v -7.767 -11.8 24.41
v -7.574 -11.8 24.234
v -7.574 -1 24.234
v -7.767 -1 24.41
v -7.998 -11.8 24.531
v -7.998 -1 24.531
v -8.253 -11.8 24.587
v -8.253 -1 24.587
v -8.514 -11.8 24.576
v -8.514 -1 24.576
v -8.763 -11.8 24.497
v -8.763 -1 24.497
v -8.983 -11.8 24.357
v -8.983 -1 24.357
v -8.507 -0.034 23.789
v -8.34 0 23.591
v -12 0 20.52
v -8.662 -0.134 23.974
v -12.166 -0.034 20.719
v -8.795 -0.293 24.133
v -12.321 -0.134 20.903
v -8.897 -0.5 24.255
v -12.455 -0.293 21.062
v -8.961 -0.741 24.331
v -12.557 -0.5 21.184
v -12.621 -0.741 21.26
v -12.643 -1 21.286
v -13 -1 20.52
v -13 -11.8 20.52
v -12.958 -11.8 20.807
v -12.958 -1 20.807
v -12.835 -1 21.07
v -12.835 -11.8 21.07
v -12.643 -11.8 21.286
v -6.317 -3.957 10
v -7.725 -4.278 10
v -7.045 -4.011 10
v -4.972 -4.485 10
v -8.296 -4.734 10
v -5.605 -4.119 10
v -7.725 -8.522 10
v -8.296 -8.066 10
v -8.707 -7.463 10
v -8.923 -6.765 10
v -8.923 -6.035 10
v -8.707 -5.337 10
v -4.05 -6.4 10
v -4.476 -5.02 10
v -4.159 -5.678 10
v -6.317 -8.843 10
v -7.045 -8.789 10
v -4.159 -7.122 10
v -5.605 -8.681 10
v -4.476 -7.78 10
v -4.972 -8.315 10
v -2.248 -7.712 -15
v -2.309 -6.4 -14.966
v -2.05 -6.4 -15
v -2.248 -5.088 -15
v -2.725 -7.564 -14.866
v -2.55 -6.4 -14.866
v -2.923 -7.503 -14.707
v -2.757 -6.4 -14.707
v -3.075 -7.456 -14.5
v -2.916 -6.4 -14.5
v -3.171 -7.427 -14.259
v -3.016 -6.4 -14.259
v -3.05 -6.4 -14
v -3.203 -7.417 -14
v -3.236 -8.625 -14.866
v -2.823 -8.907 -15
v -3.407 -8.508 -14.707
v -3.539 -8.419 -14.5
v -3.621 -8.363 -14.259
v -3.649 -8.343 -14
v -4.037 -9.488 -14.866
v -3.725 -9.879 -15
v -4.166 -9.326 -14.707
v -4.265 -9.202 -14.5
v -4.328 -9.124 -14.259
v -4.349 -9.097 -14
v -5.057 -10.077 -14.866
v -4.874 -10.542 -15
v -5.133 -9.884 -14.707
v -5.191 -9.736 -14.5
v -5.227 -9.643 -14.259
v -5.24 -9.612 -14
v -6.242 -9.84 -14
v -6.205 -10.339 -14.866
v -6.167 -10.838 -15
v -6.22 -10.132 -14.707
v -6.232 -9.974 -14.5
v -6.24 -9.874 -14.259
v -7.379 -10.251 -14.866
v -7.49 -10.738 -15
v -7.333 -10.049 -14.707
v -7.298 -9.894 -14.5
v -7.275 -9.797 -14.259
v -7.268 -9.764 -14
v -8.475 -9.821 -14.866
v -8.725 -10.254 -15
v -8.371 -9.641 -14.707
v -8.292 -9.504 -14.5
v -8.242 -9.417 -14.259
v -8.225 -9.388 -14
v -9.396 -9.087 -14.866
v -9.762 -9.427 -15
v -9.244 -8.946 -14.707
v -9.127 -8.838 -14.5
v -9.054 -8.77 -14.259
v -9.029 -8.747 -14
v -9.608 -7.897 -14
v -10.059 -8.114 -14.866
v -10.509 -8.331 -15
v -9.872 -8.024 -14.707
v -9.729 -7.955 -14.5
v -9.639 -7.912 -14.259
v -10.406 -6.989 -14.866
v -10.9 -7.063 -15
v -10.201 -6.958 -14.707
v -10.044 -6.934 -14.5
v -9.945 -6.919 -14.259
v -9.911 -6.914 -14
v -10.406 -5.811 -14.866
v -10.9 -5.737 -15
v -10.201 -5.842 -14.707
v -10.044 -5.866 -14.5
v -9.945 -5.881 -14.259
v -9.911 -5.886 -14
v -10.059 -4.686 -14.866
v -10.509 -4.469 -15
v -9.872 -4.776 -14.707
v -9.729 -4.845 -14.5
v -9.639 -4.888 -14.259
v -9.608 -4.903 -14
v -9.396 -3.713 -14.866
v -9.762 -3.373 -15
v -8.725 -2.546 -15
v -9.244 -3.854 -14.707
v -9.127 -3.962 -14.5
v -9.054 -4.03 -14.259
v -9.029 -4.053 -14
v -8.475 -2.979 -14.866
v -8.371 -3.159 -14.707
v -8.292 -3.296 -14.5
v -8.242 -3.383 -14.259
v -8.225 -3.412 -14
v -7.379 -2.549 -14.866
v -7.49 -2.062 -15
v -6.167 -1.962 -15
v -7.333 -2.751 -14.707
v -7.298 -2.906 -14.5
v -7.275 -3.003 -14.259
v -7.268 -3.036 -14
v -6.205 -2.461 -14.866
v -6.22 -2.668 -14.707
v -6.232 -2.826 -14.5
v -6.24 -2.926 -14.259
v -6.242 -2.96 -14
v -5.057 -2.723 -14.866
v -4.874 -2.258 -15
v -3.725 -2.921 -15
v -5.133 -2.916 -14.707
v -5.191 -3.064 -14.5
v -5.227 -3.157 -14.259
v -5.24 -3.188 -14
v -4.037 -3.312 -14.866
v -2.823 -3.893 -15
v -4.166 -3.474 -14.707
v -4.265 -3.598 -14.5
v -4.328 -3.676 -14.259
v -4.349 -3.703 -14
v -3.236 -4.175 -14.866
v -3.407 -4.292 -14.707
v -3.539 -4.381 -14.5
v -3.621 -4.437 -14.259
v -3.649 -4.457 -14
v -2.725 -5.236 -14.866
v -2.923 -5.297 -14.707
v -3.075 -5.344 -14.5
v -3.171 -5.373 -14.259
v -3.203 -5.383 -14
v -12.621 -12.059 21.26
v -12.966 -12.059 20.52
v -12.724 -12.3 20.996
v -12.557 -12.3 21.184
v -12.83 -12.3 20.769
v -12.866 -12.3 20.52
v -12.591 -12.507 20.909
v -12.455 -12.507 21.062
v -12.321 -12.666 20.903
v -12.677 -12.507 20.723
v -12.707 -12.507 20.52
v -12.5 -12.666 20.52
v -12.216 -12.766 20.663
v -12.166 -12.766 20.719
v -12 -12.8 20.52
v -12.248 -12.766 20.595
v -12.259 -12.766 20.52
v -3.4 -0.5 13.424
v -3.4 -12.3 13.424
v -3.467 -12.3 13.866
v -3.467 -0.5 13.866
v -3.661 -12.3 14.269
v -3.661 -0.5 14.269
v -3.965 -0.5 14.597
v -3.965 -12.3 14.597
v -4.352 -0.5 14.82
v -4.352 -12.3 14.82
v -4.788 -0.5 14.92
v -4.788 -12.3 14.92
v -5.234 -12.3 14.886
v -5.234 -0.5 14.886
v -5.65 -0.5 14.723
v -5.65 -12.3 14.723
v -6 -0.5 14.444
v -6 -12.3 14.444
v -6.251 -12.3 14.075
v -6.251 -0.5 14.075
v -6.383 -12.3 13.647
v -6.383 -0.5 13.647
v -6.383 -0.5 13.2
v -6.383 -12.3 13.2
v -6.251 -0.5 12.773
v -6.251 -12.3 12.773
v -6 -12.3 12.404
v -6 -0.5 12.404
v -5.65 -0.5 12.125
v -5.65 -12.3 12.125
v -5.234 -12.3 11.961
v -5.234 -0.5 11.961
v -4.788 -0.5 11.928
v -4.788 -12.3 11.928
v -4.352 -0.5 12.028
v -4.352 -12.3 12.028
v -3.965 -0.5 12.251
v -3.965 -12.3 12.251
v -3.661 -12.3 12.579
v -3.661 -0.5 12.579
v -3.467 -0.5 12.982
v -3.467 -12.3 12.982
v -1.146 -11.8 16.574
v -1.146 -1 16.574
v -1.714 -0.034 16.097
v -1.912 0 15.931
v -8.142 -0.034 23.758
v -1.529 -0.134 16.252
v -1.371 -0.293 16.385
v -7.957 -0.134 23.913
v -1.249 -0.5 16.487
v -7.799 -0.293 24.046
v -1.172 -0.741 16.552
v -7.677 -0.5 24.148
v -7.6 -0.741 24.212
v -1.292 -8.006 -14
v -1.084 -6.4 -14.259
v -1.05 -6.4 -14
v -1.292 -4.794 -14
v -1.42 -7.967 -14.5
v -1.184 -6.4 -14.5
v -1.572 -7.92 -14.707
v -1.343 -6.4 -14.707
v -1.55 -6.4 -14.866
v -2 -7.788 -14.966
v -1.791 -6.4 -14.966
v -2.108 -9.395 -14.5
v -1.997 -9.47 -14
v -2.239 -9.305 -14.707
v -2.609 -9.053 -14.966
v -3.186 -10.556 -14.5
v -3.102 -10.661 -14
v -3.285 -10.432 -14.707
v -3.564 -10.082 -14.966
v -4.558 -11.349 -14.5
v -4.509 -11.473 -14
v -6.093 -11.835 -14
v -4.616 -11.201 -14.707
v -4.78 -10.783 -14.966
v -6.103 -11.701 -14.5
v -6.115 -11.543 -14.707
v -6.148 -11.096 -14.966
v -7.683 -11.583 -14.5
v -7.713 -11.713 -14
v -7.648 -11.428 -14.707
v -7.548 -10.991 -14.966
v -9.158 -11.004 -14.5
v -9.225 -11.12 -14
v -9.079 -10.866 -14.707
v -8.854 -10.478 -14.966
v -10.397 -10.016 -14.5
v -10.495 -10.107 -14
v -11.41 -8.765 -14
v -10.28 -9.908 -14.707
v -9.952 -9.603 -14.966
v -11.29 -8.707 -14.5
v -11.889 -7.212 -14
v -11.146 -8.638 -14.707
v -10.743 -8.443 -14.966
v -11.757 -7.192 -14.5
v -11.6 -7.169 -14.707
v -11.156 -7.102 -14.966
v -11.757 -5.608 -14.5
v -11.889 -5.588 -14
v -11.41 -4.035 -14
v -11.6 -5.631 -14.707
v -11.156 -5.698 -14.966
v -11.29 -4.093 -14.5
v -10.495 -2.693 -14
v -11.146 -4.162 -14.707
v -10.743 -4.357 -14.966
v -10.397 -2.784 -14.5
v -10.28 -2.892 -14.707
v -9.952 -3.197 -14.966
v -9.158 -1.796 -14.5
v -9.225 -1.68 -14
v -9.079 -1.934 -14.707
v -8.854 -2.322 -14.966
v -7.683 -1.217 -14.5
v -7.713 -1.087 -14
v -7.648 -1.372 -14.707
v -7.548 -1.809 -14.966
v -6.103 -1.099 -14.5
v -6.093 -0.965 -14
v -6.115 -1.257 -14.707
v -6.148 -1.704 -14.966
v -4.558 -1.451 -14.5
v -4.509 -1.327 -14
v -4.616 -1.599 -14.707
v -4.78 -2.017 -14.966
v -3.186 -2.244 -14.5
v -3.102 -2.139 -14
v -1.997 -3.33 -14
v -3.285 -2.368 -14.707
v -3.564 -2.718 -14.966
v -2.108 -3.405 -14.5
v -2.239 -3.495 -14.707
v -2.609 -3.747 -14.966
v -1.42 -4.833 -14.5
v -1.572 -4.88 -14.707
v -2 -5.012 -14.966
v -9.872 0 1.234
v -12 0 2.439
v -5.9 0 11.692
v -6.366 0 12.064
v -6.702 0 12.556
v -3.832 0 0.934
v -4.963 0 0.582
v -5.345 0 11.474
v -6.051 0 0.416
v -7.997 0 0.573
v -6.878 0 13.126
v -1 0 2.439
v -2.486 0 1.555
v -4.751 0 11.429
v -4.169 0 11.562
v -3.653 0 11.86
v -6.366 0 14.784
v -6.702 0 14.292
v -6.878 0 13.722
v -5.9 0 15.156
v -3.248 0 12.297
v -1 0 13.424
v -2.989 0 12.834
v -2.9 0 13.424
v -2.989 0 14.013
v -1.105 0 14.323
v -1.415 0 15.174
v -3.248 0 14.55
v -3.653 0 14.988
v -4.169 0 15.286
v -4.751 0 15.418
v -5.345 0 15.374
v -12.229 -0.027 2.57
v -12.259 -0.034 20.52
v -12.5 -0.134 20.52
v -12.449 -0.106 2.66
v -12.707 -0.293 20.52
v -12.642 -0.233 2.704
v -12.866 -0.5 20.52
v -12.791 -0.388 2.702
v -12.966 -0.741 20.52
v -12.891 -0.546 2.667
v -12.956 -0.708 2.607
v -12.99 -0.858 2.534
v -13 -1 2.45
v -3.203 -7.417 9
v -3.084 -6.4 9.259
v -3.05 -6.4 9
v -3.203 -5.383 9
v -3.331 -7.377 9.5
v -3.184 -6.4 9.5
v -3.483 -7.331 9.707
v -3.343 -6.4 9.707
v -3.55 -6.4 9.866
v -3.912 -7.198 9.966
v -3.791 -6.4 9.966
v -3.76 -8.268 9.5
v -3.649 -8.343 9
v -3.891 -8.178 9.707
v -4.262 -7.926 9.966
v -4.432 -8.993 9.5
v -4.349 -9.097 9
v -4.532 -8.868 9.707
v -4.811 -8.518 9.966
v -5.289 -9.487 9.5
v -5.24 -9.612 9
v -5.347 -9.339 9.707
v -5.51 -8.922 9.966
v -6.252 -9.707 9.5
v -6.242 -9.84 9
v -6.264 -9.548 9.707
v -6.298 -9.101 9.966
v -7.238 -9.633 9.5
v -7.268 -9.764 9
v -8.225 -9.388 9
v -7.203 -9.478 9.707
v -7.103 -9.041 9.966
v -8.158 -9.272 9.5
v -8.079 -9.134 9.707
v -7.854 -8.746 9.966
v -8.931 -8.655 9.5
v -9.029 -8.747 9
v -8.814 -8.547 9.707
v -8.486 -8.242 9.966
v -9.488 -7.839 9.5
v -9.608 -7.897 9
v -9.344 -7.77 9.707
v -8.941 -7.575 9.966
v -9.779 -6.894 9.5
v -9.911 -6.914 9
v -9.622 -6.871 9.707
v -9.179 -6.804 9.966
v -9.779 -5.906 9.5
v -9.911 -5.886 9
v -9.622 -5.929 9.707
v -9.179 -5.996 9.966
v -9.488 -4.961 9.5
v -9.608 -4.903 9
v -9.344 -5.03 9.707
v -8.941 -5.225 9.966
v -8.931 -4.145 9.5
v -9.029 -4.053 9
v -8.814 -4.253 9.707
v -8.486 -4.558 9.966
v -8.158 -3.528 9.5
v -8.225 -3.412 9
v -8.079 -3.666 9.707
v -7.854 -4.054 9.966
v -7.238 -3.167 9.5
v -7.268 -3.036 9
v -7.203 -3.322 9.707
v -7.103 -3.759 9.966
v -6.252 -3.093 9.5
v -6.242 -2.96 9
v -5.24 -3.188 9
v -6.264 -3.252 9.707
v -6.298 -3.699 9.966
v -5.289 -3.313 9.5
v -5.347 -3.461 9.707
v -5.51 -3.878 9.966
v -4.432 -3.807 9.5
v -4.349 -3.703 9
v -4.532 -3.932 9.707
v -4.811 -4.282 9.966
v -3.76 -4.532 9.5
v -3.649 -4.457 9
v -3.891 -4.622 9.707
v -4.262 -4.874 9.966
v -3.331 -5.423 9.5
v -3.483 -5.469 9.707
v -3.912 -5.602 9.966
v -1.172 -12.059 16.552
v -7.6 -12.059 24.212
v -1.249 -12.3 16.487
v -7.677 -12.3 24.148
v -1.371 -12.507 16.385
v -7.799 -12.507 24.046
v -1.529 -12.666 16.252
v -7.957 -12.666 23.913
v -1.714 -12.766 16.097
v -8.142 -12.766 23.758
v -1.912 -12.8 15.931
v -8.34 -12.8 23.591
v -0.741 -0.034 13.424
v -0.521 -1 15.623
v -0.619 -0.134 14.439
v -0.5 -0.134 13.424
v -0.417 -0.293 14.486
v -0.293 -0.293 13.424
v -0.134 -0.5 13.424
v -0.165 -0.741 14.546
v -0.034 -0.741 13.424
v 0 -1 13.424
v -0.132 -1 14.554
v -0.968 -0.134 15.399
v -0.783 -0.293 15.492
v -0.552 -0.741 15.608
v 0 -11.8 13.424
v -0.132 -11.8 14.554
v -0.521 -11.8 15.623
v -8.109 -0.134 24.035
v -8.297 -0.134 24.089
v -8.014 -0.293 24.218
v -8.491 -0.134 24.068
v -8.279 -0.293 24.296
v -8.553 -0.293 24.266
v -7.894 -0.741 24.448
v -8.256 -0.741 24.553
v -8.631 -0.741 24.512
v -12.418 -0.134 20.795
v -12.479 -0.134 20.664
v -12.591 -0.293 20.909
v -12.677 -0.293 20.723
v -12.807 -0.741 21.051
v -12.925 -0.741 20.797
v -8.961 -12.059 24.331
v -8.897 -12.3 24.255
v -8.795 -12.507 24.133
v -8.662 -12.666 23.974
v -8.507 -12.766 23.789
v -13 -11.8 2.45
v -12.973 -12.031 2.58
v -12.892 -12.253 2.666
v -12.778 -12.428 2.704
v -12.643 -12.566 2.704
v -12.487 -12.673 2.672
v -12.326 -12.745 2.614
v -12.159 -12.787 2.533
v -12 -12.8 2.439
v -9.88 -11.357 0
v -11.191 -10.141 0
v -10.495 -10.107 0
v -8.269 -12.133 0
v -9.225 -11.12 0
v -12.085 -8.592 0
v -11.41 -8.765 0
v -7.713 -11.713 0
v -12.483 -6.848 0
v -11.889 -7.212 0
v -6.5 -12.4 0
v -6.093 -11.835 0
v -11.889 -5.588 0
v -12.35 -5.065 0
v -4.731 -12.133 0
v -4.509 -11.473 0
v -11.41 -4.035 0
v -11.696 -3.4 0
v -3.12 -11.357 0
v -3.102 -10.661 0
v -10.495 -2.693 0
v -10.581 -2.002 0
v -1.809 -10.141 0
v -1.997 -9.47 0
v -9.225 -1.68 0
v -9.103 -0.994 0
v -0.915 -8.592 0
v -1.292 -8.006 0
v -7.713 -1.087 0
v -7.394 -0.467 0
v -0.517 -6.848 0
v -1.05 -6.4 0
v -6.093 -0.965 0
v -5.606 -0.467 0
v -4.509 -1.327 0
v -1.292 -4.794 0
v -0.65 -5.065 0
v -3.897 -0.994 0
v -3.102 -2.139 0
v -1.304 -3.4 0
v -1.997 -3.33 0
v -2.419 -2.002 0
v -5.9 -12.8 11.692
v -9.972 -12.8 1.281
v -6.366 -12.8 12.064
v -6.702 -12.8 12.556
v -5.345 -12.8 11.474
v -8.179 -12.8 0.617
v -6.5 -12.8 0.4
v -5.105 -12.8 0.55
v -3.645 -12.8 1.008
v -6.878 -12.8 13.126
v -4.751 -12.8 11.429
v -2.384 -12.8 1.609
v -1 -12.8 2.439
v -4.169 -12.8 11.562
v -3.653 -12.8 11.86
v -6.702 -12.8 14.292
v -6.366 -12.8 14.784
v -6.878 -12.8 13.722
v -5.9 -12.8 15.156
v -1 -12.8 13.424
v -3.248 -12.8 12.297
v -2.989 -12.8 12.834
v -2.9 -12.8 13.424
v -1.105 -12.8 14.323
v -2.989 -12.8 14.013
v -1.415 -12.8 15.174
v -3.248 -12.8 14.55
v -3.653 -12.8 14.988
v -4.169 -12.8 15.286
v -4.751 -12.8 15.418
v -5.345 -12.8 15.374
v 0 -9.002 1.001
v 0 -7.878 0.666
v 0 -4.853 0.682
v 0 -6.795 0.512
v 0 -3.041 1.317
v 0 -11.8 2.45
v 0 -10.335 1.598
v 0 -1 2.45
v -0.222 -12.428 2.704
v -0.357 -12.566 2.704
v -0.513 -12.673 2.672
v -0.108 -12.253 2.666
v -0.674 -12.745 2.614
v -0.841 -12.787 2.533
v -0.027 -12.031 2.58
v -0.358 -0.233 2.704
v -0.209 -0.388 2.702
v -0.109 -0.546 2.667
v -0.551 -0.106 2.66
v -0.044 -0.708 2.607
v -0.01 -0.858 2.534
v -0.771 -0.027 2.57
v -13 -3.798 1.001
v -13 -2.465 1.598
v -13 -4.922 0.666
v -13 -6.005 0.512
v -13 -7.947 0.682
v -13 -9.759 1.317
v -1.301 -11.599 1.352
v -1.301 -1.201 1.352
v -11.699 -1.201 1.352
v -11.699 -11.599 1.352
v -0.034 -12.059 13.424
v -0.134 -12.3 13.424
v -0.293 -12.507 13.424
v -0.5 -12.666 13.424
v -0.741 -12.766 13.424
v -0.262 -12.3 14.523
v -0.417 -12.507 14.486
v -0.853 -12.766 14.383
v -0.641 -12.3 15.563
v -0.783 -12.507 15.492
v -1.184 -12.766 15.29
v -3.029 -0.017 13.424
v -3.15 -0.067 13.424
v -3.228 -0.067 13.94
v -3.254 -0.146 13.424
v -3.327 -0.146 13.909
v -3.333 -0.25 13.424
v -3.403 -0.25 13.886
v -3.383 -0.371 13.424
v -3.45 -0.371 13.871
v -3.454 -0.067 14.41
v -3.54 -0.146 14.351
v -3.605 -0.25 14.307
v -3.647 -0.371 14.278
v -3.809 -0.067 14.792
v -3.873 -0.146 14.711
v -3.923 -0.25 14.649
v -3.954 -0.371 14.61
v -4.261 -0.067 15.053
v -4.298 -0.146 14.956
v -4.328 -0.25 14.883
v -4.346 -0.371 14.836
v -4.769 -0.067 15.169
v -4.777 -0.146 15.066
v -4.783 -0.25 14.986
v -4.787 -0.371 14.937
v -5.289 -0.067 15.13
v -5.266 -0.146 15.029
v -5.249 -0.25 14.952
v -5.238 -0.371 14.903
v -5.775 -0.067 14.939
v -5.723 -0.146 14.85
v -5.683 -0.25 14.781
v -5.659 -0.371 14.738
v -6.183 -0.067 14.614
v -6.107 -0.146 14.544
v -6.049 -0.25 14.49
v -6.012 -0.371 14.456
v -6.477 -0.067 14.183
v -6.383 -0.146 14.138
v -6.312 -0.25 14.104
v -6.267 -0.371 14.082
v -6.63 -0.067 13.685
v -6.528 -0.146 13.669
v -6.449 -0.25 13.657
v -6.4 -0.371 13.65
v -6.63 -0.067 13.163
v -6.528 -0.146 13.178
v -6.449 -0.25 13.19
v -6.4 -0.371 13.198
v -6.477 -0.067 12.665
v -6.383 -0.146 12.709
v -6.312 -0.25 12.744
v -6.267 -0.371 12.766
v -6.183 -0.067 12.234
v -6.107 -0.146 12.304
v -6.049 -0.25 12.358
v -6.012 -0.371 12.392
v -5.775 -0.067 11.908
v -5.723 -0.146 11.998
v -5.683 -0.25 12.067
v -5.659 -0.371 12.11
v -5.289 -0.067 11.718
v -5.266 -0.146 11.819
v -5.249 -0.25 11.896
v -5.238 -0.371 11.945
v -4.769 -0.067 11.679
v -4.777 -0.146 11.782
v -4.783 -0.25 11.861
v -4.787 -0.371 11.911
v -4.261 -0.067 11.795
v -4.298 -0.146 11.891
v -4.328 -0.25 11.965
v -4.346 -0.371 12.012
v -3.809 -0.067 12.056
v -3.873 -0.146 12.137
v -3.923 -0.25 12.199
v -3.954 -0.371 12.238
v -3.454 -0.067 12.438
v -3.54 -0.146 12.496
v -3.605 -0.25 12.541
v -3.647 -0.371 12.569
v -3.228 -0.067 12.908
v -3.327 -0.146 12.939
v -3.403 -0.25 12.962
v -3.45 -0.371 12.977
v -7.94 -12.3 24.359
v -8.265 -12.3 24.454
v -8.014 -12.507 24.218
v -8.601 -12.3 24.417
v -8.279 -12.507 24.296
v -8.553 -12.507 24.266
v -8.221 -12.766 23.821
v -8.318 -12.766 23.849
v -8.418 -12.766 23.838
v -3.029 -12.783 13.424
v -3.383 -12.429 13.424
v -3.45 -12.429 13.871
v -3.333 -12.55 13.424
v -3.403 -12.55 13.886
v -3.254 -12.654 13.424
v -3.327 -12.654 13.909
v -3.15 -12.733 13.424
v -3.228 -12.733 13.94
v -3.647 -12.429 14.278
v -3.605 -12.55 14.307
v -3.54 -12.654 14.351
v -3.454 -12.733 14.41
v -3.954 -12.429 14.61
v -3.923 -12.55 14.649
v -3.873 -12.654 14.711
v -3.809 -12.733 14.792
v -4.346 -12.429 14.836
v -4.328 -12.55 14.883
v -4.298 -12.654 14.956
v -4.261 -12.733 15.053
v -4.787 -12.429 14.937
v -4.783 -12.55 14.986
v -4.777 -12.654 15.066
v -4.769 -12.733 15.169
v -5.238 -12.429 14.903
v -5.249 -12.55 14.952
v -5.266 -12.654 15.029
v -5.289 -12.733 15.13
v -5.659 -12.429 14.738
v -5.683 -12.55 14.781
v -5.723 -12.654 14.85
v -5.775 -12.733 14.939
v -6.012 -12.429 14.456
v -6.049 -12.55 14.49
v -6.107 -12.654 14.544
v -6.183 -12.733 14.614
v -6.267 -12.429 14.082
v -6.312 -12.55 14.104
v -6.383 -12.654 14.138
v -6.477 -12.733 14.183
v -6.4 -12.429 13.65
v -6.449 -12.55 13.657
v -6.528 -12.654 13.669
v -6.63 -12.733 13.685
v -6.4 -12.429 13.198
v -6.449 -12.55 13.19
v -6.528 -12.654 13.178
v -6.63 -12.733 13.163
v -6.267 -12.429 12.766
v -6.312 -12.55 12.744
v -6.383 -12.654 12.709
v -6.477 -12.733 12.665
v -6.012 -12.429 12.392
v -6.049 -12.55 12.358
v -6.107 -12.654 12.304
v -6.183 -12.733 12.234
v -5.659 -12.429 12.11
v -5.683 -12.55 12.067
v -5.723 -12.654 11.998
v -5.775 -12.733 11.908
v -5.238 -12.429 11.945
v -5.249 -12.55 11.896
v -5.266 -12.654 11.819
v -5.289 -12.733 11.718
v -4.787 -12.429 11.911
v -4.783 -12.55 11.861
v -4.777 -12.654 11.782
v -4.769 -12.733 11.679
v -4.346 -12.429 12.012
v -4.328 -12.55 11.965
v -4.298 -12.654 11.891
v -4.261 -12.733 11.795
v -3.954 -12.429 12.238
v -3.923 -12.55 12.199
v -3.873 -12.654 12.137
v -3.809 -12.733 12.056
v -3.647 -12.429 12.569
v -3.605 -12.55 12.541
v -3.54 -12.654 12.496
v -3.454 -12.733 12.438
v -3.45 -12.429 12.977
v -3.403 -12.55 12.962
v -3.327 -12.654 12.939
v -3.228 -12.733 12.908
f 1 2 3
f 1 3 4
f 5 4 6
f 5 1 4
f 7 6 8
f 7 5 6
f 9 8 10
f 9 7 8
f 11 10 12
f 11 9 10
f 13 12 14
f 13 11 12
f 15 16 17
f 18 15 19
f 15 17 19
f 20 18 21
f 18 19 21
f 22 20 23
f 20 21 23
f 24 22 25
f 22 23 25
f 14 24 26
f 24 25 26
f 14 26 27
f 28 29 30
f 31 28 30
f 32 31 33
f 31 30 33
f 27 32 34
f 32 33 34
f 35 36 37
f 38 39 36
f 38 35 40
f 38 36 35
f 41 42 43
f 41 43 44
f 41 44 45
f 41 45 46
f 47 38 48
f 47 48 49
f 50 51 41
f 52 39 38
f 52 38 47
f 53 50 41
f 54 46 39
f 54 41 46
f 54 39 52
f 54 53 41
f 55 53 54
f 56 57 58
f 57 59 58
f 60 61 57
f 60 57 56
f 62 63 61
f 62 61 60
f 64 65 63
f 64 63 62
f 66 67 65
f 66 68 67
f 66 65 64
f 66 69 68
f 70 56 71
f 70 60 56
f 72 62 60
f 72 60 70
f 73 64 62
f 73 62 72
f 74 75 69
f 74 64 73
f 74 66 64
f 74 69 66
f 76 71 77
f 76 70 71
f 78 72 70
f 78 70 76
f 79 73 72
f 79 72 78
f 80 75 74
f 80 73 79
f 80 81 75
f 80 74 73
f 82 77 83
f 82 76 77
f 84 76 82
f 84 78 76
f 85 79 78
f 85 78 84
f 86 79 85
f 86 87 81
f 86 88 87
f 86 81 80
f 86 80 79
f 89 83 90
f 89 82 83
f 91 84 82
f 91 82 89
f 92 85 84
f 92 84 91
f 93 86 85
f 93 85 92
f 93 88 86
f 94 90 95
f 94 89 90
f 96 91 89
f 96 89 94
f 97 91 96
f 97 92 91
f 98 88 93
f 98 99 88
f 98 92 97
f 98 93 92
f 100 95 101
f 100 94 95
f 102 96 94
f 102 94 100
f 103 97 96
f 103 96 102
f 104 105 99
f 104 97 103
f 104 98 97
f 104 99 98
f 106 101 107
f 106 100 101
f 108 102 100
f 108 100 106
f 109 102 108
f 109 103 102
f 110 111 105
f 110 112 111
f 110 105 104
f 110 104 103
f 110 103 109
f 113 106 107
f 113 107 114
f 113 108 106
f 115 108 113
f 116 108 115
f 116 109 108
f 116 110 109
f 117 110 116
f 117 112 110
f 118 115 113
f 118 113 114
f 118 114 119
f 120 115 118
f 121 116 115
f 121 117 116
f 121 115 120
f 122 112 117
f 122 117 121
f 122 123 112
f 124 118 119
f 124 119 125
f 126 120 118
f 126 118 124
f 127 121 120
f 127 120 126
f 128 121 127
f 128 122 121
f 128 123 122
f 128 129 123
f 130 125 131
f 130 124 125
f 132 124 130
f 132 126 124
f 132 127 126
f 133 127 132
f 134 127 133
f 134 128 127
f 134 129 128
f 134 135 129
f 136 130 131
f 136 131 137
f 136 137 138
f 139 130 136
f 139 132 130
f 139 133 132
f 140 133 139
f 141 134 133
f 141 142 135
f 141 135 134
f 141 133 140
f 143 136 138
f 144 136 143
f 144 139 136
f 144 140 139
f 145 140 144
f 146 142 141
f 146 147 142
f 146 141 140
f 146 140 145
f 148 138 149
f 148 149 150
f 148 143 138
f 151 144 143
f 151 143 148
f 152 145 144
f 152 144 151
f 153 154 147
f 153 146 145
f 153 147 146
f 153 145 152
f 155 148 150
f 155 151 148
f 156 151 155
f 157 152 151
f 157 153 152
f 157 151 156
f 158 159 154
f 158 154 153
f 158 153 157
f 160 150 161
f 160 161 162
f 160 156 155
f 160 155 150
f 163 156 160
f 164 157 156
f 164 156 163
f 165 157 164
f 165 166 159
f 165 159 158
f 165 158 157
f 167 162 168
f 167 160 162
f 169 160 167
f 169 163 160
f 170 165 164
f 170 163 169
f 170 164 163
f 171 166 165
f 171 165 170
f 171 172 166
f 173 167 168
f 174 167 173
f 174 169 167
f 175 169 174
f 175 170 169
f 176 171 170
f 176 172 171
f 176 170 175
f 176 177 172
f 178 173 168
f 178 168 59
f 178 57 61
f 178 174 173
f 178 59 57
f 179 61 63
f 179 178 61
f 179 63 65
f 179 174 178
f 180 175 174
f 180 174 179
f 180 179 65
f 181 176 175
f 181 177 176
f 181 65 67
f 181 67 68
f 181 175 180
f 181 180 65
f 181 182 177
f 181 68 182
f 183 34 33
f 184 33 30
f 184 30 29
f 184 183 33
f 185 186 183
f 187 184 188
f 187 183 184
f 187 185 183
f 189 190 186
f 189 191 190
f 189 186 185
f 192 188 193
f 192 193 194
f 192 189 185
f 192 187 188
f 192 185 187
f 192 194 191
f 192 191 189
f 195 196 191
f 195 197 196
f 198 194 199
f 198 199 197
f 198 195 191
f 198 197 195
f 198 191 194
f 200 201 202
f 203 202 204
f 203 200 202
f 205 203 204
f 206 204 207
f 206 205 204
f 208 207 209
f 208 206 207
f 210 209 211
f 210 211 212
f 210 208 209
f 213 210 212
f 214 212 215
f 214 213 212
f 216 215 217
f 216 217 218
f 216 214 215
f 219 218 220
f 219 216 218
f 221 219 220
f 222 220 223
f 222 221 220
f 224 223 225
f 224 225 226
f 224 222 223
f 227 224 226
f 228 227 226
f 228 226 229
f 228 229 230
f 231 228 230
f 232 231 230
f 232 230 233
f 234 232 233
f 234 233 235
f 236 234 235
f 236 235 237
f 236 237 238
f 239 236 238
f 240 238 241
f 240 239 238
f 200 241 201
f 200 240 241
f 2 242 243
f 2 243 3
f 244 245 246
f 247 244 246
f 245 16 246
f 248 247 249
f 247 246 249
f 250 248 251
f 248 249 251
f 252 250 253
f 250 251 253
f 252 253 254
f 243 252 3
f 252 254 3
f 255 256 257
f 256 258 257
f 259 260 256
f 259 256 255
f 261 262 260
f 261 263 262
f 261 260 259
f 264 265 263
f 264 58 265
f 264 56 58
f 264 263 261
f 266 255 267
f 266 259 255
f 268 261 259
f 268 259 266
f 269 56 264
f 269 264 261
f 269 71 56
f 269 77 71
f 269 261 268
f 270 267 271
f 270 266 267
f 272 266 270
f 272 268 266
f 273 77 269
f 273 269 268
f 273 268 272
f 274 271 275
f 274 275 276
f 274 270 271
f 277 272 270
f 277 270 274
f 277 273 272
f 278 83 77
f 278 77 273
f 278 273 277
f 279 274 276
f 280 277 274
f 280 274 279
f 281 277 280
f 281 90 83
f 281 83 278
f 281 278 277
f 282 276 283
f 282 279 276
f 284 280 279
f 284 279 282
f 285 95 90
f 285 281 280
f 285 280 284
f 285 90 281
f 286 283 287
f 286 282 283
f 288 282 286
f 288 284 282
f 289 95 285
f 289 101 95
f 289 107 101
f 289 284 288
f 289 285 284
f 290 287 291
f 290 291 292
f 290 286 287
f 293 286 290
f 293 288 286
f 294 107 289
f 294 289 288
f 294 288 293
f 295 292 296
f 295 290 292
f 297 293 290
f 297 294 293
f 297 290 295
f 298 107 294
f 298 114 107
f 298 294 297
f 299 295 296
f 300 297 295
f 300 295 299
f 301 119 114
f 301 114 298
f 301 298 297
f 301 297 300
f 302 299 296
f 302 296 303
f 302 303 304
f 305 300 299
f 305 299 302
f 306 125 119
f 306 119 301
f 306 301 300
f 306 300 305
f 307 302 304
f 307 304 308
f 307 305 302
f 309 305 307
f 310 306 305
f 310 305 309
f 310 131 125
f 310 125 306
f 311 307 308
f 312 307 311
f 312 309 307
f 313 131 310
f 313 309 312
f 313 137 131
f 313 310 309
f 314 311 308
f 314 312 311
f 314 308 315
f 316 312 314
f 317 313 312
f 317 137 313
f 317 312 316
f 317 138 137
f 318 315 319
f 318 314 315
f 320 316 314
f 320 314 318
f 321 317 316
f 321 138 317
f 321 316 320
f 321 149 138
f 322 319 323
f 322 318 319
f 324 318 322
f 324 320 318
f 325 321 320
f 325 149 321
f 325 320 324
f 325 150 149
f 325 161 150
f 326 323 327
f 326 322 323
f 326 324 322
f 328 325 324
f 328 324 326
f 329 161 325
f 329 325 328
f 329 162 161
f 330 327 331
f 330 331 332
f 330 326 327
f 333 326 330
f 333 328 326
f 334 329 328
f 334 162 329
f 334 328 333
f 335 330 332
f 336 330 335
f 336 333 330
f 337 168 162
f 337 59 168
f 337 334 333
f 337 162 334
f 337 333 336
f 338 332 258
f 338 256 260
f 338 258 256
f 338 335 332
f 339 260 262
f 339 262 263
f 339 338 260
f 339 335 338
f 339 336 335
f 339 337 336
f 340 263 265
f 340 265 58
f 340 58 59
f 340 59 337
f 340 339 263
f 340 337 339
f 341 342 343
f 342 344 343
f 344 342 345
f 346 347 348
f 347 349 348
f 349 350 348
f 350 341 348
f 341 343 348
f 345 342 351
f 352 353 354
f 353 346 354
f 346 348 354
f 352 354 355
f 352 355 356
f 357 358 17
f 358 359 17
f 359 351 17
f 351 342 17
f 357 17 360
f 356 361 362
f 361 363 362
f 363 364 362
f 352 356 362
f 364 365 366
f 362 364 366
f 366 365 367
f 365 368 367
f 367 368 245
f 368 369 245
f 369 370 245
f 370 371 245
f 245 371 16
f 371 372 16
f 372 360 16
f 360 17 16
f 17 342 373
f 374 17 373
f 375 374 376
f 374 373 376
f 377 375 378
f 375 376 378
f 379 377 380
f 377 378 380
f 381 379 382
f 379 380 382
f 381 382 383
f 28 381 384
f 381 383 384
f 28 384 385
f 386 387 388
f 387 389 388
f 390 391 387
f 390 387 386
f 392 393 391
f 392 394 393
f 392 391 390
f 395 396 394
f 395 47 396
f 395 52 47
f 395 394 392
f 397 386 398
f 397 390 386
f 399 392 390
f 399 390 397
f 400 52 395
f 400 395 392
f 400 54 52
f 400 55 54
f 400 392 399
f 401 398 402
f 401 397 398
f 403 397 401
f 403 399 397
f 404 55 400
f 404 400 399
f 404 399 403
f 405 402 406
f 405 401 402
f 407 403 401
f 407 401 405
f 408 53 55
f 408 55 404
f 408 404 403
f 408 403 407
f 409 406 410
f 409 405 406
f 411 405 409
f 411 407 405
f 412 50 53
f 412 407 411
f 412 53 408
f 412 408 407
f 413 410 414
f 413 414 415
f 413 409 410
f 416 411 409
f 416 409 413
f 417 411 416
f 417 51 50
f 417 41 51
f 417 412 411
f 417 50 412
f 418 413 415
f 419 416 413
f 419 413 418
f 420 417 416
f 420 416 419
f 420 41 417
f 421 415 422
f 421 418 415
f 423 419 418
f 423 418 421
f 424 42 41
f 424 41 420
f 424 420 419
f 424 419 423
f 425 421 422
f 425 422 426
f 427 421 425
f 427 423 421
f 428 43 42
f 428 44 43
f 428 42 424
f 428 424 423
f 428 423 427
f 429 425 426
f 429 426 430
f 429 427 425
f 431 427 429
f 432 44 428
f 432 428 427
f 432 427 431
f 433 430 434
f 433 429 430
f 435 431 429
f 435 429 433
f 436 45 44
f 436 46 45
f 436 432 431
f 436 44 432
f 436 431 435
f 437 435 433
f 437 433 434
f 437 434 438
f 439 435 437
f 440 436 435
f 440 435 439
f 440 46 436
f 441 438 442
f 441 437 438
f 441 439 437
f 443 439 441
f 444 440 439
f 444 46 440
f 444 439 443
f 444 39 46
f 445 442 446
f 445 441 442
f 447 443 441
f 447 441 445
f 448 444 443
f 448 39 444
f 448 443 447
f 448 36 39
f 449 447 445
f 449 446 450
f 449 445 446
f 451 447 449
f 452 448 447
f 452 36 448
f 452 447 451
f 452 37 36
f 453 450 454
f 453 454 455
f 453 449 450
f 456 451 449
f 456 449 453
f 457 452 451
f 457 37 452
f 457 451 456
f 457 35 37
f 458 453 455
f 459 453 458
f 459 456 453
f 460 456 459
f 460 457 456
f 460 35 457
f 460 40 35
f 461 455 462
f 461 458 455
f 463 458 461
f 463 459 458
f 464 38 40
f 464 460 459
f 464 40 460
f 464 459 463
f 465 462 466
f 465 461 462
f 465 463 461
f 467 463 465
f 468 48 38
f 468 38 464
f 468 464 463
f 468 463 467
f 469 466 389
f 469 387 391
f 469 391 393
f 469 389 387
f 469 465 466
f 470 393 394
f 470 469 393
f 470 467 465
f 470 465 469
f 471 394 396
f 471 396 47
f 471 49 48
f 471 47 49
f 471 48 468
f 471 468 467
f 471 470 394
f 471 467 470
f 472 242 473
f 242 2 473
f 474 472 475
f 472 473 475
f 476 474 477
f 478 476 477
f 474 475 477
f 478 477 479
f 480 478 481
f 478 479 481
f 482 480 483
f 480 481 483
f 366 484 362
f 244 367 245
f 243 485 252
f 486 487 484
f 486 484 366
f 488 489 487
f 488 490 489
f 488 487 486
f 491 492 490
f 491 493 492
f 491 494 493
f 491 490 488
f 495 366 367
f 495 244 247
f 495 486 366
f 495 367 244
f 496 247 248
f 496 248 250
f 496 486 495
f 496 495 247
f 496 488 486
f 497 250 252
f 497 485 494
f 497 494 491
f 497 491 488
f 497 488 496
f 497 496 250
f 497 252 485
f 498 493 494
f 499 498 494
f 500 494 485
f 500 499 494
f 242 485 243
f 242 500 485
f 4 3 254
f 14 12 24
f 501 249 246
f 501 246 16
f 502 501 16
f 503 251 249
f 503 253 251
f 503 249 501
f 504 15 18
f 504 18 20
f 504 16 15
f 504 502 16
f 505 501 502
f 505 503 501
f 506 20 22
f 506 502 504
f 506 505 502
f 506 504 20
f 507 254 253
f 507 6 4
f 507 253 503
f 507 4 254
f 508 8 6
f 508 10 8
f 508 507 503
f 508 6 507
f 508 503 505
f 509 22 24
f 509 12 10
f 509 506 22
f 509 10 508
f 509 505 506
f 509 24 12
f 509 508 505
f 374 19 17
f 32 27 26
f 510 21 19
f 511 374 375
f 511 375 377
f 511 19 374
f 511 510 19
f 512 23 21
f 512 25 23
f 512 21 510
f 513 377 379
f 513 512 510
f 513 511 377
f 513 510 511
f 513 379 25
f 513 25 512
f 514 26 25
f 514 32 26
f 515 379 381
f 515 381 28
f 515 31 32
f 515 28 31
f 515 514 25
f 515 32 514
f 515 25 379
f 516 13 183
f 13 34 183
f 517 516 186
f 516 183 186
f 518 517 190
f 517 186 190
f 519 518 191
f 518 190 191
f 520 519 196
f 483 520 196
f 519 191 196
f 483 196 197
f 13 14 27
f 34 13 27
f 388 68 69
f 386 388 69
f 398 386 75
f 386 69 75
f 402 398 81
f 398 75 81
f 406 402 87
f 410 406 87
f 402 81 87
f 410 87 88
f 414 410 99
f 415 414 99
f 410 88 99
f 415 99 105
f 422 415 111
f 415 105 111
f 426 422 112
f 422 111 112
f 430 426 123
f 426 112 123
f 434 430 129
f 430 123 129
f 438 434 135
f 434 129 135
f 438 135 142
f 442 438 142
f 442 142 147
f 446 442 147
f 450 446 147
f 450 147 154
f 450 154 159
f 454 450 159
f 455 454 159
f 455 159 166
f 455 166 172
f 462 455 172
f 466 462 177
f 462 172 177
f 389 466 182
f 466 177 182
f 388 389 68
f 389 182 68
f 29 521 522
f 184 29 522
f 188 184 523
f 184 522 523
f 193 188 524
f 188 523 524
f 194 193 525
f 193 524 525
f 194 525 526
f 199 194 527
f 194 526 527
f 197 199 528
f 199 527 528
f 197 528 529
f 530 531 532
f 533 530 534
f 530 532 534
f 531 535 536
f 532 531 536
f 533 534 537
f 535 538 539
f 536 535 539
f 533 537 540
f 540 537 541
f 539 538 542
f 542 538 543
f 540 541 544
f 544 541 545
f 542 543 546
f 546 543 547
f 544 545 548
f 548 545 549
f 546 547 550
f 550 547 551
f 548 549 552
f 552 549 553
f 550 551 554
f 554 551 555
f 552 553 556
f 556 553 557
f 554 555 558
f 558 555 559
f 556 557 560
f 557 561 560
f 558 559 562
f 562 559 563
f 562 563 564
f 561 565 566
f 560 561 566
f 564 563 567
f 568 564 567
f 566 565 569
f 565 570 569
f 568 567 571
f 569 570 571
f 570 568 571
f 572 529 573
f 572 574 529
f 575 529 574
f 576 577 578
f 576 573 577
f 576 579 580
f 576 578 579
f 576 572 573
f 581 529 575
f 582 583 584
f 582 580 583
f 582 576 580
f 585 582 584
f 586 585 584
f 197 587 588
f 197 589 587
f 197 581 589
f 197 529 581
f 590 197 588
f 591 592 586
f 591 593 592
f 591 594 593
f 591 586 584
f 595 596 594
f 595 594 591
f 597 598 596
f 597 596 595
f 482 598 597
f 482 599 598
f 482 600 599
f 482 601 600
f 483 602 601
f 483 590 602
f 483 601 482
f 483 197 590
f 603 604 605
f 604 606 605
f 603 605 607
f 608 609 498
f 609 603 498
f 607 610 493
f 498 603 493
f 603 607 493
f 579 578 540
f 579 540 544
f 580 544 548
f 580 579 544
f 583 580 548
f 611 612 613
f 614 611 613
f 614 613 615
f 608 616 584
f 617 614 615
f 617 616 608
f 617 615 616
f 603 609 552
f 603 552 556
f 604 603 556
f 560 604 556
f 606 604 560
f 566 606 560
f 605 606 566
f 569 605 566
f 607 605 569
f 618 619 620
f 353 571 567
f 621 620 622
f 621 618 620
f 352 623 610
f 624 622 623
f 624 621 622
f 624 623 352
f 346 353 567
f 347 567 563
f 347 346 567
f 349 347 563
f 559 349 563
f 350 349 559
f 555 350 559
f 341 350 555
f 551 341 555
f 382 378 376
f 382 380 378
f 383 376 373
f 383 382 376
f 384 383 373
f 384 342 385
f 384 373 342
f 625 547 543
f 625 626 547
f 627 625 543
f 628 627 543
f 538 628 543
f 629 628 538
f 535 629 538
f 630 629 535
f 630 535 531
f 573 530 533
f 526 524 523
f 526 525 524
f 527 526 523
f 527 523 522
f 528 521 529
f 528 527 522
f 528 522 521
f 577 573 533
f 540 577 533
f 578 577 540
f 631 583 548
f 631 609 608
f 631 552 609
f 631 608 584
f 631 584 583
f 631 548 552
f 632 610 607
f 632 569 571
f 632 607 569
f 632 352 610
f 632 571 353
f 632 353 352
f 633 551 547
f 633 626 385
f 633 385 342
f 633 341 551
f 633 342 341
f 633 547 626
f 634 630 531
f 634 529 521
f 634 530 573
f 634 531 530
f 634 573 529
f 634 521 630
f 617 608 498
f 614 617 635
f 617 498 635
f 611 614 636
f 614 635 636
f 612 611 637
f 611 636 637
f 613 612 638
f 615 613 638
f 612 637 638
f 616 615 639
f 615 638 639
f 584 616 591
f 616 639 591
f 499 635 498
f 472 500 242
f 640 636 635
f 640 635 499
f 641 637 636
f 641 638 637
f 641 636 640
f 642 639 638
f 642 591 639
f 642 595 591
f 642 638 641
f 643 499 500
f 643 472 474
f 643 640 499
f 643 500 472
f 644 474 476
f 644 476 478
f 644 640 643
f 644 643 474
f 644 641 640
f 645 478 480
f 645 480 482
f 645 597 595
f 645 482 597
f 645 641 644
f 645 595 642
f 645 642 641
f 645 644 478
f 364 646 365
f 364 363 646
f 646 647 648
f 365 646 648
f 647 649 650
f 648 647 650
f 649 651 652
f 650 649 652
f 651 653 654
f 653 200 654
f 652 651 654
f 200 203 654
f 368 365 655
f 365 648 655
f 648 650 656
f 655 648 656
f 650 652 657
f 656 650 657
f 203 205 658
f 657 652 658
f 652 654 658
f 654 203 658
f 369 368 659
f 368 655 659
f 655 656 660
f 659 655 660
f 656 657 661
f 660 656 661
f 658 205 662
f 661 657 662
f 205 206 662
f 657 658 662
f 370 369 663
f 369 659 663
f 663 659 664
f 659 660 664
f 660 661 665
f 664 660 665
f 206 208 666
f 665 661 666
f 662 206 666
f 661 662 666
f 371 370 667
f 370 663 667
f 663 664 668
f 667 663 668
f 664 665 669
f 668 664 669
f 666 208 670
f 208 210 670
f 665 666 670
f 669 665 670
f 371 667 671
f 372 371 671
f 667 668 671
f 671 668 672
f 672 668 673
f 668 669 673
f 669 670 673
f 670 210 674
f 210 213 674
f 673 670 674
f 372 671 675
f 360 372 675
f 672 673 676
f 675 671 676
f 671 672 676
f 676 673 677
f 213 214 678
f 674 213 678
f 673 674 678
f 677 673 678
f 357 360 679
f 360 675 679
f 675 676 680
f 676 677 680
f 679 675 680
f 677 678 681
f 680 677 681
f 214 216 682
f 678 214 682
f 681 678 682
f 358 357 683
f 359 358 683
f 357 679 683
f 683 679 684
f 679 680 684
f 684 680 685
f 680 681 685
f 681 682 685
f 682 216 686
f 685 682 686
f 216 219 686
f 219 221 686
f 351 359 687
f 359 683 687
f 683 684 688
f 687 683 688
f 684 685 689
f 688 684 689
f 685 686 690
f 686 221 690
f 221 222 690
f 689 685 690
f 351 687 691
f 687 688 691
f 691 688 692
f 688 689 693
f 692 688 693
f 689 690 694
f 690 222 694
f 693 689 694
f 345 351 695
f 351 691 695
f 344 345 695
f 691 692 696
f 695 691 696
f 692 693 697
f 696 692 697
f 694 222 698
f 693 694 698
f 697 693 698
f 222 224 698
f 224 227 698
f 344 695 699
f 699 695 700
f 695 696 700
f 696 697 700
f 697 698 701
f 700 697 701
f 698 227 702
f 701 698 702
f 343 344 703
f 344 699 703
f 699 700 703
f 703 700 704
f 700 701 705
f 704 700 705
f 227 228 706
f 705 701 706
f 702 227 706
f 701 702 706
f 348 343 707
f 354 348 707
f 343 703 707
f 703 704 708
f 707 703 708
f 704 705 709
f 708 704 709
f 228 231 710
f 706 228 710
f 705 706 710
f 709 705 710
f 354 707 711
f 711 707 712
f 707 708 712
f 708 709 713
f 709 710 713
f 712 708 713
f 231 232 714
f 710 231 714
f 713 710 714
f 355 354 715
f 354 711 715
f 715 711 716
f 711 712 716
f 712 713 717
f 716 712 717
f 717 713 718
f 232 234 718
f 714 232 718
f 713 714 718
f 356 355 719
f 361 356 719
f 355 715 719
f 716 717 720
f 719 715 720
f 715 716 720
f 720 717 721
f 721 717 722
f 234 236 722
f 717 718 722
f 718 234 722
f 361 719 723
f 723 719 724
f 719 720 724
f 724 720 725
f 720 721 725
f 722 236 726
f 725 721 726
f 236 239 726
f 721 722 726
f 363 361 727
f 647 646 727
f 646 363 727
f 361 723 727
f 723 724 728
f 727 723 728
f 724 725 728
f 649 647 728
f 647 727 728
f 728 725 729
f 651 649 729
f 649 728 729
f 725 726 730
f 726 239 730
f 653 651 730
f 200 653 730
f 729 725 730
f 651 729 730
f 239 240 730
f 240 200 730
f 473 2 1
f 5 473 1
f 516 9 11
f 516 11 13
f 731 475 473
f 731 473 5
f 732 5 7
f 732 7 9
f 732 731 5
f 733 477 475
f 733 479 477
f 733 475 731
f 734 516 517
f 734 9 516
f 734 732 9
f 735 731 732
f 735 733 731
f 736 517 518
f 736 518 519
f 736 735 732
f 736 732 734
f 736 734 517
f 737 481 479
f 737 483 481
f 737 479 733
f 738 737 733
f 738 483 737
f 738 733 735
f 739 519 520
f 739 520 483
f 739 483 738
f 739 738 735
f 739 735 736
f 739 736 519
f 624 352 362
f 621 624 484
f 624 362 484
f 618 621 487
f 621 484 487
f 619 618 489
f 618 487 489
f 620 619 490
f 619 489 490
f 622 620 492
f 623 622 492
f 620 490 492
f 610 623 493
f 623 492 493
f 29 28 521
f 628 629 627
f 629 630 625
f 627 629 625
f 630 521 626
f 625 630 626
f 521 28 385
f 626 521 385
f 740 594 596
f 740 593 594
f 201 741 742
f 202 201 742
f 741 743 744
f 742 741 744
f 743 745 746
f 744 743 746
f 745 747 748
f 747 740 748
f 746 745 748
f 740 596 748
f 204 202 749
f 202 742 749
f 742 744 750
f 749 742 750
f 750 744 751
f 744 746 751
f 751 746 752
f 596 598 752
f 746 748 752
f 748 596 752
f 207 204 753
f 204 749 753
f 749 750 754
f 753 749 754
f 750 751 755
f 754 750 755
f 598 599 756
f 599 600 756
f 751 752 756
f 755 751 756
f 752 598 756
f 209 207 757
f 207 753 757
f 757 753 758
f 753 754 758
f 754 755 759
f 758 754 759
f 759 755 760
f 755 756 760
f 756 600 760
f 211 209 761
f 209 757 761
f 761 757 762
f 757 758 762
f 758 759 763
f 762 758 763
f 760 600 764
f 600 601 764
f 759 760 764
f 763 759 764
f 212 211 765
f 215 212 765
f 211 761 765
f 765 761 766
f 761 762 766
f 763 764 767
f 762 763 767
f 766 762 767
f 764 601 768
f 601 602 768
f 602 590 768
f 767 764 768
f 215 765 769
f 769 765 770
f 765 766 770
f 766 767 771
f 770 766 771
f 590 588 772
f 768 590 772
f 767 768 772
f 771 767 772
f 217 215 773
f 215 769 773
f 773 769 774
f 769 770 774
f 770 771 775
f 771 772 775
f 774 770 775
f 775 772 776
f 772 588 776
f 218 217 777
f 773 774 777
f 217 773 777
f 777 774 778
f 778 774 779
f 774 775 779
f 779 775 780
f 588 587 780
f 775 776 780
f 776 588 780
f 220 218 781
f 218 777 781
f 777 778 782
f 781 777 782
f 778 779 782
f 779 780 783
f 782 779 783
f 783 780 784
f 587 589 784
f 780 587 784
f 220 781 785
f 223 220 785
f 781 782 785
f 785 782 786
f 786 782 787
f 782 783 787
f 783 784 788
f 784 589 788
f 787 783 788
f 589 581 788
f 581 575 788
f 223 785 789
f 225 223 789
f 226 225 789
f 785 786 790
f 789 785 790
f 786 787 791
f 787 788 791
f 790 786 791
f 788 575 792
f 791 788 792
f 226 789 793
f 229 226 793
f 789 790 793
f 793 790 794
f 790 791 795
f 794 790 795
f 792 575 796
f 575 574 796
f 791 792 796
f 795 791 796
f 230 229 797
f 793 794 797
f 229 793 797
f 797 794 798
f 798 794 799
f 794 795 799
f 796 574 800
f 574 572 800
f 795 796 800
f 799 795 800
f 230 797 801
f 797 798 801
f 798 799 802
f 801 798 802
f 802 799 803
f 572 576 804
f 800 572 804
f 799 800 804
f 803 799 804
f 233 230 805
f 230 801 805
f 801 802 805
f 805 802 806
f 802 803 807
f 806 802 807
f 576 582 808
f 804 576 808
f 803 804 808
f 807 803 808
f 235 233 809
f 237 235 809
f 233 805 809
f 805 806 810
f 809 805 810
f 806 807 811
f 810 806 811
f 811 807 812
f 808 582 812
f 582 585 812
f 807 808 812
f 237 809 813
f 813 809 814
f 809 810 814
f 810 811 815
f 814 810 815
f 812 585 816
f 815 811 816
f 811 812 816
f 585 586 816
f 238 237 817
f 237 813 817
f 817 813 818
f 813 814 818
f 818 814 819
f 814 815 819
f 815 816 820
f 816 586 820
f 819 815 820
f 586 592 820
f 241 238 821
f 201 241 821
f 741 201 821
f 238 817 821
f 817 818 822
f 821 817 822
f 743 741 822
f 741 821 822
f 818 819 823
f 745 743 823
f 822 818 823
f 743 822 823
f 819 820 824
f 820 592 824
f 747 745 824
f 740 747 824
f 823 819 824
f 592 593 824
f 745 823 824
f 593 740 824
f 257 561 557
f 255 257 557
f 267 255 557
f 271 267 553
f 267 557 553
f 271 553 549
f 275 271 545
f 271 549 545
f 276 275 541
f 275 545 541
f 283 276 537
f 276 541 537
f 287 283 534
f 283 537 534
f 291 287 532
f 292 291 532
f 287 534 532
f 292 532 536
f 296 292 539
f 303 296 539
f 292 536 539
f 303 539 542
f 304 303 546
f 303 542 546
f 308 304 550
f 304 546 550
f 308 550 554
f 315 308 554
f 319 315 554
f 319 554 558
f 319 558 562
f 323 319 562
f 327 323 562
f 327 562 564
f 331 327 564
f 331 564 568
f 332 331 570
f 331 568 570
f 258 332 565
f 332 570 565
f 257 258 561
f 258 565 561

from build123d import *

# Parameters (mm, degrees)
F0_R      = 1.5
F1_DEPTH  = 12.8
F2_R      = 4.9
F3_R      = 1
F4_R      = 5.45
F5_DEPTH  = 15
F9_R      = 3.45
F10_DEPTH = 25
F11_R     = 0.99999
F12_R     = 0.5


# Not quite as in the source:
# - a fillet or chamfer is up to 0.001 mm smaller than in the source, because OpenCascade refuses the exact size


with BuildPart() as f1:
    # F0 (on Front) → F1 (new body)
    with BuildSketch(Plane.XZ):
        Polygon((-13, 0), (0, 0), (0, 15.2073059861), (-8.2170459353, 25), (-13, 20.9866250083), align=None)
        with Locations((-4.9, 13.4238518382)):
            Circle(F0_R, mode=Mode.SUBTRACT)
    extrude(amount=F1_DEPTH)

    # F2
    f2_edges = [f1.edges().sort_by_distance(p)[0] for p in [
        (0, -6.4, 15.207306),
    ]]
    fillet(f2_edges, radius=F2_R)

    # F3
    f3_edges = [f1.edges().sort_by_distance(p)[0] for p in [
        (-8.217046, -6.4, 25),
        (-13, -6.4, 20.986625),
    ]]
    fillet(f3_edges, radius=F3_R)

    # F4 (on face) → F5 (join)
    with BuildSketch(Plane(origin=(0, 0, 0), x_dir=(1, 0, 0), z_dir=(0, 0, -1))):
        with Locations((-6.5, 6.4)):
            Circle(F4_R)
    extrude(amount=F5_DEPTH)

    # F7 (on offset) → F8 (revolve, cut)
    with BuildSketch(Plane.YZ.offset(-6.5)):
        Polygon((-17.4, 0), (-12.4, 0), (-17.4, 5), align=None)
    revolve(axis=Axis((-6.5, -6.4, -7.3510144139), (0, 0, 1)), mode=Mode.SUBTRACT)

    # F9 (on face) → F10 (cut)
    with BuildSketch(Plane(origin=(0, 0, -15), x_dir=(1, 0, 0), z_dir=(0, 0, -1))):
        with Locations((-6.5, 6.4)):
            Circle(F9_R)
    extrude(amount=-F10_DEPTH, mode=Mode.SUBTRACT)

    # F11 (radius 1 in the source; OpenCascade refuses exactly that, so slightly less here)
    f11_edges = [f1.edges().sort_by_distance(p)[0] for p in [
        (-11.95, -6.4, -15),
        (-9.95, -6.4, -15),
        (-13, 0, 11.821134),
        (0, -12.8, 8.272902),
        (-9.95, -6.4, 10),
    ]]
    fillet(f11_edges, radius=F11_R)

    # F12
    f12_edges = [f1.edges().sort_by_distance(p)[0] for p in [
        (-6.4, -12.8, 13.423852),
        (-6.4, 0, 13.423852),
    ]]
    fillet(f12_edges, radius=F12_R)


solid = f1.part
